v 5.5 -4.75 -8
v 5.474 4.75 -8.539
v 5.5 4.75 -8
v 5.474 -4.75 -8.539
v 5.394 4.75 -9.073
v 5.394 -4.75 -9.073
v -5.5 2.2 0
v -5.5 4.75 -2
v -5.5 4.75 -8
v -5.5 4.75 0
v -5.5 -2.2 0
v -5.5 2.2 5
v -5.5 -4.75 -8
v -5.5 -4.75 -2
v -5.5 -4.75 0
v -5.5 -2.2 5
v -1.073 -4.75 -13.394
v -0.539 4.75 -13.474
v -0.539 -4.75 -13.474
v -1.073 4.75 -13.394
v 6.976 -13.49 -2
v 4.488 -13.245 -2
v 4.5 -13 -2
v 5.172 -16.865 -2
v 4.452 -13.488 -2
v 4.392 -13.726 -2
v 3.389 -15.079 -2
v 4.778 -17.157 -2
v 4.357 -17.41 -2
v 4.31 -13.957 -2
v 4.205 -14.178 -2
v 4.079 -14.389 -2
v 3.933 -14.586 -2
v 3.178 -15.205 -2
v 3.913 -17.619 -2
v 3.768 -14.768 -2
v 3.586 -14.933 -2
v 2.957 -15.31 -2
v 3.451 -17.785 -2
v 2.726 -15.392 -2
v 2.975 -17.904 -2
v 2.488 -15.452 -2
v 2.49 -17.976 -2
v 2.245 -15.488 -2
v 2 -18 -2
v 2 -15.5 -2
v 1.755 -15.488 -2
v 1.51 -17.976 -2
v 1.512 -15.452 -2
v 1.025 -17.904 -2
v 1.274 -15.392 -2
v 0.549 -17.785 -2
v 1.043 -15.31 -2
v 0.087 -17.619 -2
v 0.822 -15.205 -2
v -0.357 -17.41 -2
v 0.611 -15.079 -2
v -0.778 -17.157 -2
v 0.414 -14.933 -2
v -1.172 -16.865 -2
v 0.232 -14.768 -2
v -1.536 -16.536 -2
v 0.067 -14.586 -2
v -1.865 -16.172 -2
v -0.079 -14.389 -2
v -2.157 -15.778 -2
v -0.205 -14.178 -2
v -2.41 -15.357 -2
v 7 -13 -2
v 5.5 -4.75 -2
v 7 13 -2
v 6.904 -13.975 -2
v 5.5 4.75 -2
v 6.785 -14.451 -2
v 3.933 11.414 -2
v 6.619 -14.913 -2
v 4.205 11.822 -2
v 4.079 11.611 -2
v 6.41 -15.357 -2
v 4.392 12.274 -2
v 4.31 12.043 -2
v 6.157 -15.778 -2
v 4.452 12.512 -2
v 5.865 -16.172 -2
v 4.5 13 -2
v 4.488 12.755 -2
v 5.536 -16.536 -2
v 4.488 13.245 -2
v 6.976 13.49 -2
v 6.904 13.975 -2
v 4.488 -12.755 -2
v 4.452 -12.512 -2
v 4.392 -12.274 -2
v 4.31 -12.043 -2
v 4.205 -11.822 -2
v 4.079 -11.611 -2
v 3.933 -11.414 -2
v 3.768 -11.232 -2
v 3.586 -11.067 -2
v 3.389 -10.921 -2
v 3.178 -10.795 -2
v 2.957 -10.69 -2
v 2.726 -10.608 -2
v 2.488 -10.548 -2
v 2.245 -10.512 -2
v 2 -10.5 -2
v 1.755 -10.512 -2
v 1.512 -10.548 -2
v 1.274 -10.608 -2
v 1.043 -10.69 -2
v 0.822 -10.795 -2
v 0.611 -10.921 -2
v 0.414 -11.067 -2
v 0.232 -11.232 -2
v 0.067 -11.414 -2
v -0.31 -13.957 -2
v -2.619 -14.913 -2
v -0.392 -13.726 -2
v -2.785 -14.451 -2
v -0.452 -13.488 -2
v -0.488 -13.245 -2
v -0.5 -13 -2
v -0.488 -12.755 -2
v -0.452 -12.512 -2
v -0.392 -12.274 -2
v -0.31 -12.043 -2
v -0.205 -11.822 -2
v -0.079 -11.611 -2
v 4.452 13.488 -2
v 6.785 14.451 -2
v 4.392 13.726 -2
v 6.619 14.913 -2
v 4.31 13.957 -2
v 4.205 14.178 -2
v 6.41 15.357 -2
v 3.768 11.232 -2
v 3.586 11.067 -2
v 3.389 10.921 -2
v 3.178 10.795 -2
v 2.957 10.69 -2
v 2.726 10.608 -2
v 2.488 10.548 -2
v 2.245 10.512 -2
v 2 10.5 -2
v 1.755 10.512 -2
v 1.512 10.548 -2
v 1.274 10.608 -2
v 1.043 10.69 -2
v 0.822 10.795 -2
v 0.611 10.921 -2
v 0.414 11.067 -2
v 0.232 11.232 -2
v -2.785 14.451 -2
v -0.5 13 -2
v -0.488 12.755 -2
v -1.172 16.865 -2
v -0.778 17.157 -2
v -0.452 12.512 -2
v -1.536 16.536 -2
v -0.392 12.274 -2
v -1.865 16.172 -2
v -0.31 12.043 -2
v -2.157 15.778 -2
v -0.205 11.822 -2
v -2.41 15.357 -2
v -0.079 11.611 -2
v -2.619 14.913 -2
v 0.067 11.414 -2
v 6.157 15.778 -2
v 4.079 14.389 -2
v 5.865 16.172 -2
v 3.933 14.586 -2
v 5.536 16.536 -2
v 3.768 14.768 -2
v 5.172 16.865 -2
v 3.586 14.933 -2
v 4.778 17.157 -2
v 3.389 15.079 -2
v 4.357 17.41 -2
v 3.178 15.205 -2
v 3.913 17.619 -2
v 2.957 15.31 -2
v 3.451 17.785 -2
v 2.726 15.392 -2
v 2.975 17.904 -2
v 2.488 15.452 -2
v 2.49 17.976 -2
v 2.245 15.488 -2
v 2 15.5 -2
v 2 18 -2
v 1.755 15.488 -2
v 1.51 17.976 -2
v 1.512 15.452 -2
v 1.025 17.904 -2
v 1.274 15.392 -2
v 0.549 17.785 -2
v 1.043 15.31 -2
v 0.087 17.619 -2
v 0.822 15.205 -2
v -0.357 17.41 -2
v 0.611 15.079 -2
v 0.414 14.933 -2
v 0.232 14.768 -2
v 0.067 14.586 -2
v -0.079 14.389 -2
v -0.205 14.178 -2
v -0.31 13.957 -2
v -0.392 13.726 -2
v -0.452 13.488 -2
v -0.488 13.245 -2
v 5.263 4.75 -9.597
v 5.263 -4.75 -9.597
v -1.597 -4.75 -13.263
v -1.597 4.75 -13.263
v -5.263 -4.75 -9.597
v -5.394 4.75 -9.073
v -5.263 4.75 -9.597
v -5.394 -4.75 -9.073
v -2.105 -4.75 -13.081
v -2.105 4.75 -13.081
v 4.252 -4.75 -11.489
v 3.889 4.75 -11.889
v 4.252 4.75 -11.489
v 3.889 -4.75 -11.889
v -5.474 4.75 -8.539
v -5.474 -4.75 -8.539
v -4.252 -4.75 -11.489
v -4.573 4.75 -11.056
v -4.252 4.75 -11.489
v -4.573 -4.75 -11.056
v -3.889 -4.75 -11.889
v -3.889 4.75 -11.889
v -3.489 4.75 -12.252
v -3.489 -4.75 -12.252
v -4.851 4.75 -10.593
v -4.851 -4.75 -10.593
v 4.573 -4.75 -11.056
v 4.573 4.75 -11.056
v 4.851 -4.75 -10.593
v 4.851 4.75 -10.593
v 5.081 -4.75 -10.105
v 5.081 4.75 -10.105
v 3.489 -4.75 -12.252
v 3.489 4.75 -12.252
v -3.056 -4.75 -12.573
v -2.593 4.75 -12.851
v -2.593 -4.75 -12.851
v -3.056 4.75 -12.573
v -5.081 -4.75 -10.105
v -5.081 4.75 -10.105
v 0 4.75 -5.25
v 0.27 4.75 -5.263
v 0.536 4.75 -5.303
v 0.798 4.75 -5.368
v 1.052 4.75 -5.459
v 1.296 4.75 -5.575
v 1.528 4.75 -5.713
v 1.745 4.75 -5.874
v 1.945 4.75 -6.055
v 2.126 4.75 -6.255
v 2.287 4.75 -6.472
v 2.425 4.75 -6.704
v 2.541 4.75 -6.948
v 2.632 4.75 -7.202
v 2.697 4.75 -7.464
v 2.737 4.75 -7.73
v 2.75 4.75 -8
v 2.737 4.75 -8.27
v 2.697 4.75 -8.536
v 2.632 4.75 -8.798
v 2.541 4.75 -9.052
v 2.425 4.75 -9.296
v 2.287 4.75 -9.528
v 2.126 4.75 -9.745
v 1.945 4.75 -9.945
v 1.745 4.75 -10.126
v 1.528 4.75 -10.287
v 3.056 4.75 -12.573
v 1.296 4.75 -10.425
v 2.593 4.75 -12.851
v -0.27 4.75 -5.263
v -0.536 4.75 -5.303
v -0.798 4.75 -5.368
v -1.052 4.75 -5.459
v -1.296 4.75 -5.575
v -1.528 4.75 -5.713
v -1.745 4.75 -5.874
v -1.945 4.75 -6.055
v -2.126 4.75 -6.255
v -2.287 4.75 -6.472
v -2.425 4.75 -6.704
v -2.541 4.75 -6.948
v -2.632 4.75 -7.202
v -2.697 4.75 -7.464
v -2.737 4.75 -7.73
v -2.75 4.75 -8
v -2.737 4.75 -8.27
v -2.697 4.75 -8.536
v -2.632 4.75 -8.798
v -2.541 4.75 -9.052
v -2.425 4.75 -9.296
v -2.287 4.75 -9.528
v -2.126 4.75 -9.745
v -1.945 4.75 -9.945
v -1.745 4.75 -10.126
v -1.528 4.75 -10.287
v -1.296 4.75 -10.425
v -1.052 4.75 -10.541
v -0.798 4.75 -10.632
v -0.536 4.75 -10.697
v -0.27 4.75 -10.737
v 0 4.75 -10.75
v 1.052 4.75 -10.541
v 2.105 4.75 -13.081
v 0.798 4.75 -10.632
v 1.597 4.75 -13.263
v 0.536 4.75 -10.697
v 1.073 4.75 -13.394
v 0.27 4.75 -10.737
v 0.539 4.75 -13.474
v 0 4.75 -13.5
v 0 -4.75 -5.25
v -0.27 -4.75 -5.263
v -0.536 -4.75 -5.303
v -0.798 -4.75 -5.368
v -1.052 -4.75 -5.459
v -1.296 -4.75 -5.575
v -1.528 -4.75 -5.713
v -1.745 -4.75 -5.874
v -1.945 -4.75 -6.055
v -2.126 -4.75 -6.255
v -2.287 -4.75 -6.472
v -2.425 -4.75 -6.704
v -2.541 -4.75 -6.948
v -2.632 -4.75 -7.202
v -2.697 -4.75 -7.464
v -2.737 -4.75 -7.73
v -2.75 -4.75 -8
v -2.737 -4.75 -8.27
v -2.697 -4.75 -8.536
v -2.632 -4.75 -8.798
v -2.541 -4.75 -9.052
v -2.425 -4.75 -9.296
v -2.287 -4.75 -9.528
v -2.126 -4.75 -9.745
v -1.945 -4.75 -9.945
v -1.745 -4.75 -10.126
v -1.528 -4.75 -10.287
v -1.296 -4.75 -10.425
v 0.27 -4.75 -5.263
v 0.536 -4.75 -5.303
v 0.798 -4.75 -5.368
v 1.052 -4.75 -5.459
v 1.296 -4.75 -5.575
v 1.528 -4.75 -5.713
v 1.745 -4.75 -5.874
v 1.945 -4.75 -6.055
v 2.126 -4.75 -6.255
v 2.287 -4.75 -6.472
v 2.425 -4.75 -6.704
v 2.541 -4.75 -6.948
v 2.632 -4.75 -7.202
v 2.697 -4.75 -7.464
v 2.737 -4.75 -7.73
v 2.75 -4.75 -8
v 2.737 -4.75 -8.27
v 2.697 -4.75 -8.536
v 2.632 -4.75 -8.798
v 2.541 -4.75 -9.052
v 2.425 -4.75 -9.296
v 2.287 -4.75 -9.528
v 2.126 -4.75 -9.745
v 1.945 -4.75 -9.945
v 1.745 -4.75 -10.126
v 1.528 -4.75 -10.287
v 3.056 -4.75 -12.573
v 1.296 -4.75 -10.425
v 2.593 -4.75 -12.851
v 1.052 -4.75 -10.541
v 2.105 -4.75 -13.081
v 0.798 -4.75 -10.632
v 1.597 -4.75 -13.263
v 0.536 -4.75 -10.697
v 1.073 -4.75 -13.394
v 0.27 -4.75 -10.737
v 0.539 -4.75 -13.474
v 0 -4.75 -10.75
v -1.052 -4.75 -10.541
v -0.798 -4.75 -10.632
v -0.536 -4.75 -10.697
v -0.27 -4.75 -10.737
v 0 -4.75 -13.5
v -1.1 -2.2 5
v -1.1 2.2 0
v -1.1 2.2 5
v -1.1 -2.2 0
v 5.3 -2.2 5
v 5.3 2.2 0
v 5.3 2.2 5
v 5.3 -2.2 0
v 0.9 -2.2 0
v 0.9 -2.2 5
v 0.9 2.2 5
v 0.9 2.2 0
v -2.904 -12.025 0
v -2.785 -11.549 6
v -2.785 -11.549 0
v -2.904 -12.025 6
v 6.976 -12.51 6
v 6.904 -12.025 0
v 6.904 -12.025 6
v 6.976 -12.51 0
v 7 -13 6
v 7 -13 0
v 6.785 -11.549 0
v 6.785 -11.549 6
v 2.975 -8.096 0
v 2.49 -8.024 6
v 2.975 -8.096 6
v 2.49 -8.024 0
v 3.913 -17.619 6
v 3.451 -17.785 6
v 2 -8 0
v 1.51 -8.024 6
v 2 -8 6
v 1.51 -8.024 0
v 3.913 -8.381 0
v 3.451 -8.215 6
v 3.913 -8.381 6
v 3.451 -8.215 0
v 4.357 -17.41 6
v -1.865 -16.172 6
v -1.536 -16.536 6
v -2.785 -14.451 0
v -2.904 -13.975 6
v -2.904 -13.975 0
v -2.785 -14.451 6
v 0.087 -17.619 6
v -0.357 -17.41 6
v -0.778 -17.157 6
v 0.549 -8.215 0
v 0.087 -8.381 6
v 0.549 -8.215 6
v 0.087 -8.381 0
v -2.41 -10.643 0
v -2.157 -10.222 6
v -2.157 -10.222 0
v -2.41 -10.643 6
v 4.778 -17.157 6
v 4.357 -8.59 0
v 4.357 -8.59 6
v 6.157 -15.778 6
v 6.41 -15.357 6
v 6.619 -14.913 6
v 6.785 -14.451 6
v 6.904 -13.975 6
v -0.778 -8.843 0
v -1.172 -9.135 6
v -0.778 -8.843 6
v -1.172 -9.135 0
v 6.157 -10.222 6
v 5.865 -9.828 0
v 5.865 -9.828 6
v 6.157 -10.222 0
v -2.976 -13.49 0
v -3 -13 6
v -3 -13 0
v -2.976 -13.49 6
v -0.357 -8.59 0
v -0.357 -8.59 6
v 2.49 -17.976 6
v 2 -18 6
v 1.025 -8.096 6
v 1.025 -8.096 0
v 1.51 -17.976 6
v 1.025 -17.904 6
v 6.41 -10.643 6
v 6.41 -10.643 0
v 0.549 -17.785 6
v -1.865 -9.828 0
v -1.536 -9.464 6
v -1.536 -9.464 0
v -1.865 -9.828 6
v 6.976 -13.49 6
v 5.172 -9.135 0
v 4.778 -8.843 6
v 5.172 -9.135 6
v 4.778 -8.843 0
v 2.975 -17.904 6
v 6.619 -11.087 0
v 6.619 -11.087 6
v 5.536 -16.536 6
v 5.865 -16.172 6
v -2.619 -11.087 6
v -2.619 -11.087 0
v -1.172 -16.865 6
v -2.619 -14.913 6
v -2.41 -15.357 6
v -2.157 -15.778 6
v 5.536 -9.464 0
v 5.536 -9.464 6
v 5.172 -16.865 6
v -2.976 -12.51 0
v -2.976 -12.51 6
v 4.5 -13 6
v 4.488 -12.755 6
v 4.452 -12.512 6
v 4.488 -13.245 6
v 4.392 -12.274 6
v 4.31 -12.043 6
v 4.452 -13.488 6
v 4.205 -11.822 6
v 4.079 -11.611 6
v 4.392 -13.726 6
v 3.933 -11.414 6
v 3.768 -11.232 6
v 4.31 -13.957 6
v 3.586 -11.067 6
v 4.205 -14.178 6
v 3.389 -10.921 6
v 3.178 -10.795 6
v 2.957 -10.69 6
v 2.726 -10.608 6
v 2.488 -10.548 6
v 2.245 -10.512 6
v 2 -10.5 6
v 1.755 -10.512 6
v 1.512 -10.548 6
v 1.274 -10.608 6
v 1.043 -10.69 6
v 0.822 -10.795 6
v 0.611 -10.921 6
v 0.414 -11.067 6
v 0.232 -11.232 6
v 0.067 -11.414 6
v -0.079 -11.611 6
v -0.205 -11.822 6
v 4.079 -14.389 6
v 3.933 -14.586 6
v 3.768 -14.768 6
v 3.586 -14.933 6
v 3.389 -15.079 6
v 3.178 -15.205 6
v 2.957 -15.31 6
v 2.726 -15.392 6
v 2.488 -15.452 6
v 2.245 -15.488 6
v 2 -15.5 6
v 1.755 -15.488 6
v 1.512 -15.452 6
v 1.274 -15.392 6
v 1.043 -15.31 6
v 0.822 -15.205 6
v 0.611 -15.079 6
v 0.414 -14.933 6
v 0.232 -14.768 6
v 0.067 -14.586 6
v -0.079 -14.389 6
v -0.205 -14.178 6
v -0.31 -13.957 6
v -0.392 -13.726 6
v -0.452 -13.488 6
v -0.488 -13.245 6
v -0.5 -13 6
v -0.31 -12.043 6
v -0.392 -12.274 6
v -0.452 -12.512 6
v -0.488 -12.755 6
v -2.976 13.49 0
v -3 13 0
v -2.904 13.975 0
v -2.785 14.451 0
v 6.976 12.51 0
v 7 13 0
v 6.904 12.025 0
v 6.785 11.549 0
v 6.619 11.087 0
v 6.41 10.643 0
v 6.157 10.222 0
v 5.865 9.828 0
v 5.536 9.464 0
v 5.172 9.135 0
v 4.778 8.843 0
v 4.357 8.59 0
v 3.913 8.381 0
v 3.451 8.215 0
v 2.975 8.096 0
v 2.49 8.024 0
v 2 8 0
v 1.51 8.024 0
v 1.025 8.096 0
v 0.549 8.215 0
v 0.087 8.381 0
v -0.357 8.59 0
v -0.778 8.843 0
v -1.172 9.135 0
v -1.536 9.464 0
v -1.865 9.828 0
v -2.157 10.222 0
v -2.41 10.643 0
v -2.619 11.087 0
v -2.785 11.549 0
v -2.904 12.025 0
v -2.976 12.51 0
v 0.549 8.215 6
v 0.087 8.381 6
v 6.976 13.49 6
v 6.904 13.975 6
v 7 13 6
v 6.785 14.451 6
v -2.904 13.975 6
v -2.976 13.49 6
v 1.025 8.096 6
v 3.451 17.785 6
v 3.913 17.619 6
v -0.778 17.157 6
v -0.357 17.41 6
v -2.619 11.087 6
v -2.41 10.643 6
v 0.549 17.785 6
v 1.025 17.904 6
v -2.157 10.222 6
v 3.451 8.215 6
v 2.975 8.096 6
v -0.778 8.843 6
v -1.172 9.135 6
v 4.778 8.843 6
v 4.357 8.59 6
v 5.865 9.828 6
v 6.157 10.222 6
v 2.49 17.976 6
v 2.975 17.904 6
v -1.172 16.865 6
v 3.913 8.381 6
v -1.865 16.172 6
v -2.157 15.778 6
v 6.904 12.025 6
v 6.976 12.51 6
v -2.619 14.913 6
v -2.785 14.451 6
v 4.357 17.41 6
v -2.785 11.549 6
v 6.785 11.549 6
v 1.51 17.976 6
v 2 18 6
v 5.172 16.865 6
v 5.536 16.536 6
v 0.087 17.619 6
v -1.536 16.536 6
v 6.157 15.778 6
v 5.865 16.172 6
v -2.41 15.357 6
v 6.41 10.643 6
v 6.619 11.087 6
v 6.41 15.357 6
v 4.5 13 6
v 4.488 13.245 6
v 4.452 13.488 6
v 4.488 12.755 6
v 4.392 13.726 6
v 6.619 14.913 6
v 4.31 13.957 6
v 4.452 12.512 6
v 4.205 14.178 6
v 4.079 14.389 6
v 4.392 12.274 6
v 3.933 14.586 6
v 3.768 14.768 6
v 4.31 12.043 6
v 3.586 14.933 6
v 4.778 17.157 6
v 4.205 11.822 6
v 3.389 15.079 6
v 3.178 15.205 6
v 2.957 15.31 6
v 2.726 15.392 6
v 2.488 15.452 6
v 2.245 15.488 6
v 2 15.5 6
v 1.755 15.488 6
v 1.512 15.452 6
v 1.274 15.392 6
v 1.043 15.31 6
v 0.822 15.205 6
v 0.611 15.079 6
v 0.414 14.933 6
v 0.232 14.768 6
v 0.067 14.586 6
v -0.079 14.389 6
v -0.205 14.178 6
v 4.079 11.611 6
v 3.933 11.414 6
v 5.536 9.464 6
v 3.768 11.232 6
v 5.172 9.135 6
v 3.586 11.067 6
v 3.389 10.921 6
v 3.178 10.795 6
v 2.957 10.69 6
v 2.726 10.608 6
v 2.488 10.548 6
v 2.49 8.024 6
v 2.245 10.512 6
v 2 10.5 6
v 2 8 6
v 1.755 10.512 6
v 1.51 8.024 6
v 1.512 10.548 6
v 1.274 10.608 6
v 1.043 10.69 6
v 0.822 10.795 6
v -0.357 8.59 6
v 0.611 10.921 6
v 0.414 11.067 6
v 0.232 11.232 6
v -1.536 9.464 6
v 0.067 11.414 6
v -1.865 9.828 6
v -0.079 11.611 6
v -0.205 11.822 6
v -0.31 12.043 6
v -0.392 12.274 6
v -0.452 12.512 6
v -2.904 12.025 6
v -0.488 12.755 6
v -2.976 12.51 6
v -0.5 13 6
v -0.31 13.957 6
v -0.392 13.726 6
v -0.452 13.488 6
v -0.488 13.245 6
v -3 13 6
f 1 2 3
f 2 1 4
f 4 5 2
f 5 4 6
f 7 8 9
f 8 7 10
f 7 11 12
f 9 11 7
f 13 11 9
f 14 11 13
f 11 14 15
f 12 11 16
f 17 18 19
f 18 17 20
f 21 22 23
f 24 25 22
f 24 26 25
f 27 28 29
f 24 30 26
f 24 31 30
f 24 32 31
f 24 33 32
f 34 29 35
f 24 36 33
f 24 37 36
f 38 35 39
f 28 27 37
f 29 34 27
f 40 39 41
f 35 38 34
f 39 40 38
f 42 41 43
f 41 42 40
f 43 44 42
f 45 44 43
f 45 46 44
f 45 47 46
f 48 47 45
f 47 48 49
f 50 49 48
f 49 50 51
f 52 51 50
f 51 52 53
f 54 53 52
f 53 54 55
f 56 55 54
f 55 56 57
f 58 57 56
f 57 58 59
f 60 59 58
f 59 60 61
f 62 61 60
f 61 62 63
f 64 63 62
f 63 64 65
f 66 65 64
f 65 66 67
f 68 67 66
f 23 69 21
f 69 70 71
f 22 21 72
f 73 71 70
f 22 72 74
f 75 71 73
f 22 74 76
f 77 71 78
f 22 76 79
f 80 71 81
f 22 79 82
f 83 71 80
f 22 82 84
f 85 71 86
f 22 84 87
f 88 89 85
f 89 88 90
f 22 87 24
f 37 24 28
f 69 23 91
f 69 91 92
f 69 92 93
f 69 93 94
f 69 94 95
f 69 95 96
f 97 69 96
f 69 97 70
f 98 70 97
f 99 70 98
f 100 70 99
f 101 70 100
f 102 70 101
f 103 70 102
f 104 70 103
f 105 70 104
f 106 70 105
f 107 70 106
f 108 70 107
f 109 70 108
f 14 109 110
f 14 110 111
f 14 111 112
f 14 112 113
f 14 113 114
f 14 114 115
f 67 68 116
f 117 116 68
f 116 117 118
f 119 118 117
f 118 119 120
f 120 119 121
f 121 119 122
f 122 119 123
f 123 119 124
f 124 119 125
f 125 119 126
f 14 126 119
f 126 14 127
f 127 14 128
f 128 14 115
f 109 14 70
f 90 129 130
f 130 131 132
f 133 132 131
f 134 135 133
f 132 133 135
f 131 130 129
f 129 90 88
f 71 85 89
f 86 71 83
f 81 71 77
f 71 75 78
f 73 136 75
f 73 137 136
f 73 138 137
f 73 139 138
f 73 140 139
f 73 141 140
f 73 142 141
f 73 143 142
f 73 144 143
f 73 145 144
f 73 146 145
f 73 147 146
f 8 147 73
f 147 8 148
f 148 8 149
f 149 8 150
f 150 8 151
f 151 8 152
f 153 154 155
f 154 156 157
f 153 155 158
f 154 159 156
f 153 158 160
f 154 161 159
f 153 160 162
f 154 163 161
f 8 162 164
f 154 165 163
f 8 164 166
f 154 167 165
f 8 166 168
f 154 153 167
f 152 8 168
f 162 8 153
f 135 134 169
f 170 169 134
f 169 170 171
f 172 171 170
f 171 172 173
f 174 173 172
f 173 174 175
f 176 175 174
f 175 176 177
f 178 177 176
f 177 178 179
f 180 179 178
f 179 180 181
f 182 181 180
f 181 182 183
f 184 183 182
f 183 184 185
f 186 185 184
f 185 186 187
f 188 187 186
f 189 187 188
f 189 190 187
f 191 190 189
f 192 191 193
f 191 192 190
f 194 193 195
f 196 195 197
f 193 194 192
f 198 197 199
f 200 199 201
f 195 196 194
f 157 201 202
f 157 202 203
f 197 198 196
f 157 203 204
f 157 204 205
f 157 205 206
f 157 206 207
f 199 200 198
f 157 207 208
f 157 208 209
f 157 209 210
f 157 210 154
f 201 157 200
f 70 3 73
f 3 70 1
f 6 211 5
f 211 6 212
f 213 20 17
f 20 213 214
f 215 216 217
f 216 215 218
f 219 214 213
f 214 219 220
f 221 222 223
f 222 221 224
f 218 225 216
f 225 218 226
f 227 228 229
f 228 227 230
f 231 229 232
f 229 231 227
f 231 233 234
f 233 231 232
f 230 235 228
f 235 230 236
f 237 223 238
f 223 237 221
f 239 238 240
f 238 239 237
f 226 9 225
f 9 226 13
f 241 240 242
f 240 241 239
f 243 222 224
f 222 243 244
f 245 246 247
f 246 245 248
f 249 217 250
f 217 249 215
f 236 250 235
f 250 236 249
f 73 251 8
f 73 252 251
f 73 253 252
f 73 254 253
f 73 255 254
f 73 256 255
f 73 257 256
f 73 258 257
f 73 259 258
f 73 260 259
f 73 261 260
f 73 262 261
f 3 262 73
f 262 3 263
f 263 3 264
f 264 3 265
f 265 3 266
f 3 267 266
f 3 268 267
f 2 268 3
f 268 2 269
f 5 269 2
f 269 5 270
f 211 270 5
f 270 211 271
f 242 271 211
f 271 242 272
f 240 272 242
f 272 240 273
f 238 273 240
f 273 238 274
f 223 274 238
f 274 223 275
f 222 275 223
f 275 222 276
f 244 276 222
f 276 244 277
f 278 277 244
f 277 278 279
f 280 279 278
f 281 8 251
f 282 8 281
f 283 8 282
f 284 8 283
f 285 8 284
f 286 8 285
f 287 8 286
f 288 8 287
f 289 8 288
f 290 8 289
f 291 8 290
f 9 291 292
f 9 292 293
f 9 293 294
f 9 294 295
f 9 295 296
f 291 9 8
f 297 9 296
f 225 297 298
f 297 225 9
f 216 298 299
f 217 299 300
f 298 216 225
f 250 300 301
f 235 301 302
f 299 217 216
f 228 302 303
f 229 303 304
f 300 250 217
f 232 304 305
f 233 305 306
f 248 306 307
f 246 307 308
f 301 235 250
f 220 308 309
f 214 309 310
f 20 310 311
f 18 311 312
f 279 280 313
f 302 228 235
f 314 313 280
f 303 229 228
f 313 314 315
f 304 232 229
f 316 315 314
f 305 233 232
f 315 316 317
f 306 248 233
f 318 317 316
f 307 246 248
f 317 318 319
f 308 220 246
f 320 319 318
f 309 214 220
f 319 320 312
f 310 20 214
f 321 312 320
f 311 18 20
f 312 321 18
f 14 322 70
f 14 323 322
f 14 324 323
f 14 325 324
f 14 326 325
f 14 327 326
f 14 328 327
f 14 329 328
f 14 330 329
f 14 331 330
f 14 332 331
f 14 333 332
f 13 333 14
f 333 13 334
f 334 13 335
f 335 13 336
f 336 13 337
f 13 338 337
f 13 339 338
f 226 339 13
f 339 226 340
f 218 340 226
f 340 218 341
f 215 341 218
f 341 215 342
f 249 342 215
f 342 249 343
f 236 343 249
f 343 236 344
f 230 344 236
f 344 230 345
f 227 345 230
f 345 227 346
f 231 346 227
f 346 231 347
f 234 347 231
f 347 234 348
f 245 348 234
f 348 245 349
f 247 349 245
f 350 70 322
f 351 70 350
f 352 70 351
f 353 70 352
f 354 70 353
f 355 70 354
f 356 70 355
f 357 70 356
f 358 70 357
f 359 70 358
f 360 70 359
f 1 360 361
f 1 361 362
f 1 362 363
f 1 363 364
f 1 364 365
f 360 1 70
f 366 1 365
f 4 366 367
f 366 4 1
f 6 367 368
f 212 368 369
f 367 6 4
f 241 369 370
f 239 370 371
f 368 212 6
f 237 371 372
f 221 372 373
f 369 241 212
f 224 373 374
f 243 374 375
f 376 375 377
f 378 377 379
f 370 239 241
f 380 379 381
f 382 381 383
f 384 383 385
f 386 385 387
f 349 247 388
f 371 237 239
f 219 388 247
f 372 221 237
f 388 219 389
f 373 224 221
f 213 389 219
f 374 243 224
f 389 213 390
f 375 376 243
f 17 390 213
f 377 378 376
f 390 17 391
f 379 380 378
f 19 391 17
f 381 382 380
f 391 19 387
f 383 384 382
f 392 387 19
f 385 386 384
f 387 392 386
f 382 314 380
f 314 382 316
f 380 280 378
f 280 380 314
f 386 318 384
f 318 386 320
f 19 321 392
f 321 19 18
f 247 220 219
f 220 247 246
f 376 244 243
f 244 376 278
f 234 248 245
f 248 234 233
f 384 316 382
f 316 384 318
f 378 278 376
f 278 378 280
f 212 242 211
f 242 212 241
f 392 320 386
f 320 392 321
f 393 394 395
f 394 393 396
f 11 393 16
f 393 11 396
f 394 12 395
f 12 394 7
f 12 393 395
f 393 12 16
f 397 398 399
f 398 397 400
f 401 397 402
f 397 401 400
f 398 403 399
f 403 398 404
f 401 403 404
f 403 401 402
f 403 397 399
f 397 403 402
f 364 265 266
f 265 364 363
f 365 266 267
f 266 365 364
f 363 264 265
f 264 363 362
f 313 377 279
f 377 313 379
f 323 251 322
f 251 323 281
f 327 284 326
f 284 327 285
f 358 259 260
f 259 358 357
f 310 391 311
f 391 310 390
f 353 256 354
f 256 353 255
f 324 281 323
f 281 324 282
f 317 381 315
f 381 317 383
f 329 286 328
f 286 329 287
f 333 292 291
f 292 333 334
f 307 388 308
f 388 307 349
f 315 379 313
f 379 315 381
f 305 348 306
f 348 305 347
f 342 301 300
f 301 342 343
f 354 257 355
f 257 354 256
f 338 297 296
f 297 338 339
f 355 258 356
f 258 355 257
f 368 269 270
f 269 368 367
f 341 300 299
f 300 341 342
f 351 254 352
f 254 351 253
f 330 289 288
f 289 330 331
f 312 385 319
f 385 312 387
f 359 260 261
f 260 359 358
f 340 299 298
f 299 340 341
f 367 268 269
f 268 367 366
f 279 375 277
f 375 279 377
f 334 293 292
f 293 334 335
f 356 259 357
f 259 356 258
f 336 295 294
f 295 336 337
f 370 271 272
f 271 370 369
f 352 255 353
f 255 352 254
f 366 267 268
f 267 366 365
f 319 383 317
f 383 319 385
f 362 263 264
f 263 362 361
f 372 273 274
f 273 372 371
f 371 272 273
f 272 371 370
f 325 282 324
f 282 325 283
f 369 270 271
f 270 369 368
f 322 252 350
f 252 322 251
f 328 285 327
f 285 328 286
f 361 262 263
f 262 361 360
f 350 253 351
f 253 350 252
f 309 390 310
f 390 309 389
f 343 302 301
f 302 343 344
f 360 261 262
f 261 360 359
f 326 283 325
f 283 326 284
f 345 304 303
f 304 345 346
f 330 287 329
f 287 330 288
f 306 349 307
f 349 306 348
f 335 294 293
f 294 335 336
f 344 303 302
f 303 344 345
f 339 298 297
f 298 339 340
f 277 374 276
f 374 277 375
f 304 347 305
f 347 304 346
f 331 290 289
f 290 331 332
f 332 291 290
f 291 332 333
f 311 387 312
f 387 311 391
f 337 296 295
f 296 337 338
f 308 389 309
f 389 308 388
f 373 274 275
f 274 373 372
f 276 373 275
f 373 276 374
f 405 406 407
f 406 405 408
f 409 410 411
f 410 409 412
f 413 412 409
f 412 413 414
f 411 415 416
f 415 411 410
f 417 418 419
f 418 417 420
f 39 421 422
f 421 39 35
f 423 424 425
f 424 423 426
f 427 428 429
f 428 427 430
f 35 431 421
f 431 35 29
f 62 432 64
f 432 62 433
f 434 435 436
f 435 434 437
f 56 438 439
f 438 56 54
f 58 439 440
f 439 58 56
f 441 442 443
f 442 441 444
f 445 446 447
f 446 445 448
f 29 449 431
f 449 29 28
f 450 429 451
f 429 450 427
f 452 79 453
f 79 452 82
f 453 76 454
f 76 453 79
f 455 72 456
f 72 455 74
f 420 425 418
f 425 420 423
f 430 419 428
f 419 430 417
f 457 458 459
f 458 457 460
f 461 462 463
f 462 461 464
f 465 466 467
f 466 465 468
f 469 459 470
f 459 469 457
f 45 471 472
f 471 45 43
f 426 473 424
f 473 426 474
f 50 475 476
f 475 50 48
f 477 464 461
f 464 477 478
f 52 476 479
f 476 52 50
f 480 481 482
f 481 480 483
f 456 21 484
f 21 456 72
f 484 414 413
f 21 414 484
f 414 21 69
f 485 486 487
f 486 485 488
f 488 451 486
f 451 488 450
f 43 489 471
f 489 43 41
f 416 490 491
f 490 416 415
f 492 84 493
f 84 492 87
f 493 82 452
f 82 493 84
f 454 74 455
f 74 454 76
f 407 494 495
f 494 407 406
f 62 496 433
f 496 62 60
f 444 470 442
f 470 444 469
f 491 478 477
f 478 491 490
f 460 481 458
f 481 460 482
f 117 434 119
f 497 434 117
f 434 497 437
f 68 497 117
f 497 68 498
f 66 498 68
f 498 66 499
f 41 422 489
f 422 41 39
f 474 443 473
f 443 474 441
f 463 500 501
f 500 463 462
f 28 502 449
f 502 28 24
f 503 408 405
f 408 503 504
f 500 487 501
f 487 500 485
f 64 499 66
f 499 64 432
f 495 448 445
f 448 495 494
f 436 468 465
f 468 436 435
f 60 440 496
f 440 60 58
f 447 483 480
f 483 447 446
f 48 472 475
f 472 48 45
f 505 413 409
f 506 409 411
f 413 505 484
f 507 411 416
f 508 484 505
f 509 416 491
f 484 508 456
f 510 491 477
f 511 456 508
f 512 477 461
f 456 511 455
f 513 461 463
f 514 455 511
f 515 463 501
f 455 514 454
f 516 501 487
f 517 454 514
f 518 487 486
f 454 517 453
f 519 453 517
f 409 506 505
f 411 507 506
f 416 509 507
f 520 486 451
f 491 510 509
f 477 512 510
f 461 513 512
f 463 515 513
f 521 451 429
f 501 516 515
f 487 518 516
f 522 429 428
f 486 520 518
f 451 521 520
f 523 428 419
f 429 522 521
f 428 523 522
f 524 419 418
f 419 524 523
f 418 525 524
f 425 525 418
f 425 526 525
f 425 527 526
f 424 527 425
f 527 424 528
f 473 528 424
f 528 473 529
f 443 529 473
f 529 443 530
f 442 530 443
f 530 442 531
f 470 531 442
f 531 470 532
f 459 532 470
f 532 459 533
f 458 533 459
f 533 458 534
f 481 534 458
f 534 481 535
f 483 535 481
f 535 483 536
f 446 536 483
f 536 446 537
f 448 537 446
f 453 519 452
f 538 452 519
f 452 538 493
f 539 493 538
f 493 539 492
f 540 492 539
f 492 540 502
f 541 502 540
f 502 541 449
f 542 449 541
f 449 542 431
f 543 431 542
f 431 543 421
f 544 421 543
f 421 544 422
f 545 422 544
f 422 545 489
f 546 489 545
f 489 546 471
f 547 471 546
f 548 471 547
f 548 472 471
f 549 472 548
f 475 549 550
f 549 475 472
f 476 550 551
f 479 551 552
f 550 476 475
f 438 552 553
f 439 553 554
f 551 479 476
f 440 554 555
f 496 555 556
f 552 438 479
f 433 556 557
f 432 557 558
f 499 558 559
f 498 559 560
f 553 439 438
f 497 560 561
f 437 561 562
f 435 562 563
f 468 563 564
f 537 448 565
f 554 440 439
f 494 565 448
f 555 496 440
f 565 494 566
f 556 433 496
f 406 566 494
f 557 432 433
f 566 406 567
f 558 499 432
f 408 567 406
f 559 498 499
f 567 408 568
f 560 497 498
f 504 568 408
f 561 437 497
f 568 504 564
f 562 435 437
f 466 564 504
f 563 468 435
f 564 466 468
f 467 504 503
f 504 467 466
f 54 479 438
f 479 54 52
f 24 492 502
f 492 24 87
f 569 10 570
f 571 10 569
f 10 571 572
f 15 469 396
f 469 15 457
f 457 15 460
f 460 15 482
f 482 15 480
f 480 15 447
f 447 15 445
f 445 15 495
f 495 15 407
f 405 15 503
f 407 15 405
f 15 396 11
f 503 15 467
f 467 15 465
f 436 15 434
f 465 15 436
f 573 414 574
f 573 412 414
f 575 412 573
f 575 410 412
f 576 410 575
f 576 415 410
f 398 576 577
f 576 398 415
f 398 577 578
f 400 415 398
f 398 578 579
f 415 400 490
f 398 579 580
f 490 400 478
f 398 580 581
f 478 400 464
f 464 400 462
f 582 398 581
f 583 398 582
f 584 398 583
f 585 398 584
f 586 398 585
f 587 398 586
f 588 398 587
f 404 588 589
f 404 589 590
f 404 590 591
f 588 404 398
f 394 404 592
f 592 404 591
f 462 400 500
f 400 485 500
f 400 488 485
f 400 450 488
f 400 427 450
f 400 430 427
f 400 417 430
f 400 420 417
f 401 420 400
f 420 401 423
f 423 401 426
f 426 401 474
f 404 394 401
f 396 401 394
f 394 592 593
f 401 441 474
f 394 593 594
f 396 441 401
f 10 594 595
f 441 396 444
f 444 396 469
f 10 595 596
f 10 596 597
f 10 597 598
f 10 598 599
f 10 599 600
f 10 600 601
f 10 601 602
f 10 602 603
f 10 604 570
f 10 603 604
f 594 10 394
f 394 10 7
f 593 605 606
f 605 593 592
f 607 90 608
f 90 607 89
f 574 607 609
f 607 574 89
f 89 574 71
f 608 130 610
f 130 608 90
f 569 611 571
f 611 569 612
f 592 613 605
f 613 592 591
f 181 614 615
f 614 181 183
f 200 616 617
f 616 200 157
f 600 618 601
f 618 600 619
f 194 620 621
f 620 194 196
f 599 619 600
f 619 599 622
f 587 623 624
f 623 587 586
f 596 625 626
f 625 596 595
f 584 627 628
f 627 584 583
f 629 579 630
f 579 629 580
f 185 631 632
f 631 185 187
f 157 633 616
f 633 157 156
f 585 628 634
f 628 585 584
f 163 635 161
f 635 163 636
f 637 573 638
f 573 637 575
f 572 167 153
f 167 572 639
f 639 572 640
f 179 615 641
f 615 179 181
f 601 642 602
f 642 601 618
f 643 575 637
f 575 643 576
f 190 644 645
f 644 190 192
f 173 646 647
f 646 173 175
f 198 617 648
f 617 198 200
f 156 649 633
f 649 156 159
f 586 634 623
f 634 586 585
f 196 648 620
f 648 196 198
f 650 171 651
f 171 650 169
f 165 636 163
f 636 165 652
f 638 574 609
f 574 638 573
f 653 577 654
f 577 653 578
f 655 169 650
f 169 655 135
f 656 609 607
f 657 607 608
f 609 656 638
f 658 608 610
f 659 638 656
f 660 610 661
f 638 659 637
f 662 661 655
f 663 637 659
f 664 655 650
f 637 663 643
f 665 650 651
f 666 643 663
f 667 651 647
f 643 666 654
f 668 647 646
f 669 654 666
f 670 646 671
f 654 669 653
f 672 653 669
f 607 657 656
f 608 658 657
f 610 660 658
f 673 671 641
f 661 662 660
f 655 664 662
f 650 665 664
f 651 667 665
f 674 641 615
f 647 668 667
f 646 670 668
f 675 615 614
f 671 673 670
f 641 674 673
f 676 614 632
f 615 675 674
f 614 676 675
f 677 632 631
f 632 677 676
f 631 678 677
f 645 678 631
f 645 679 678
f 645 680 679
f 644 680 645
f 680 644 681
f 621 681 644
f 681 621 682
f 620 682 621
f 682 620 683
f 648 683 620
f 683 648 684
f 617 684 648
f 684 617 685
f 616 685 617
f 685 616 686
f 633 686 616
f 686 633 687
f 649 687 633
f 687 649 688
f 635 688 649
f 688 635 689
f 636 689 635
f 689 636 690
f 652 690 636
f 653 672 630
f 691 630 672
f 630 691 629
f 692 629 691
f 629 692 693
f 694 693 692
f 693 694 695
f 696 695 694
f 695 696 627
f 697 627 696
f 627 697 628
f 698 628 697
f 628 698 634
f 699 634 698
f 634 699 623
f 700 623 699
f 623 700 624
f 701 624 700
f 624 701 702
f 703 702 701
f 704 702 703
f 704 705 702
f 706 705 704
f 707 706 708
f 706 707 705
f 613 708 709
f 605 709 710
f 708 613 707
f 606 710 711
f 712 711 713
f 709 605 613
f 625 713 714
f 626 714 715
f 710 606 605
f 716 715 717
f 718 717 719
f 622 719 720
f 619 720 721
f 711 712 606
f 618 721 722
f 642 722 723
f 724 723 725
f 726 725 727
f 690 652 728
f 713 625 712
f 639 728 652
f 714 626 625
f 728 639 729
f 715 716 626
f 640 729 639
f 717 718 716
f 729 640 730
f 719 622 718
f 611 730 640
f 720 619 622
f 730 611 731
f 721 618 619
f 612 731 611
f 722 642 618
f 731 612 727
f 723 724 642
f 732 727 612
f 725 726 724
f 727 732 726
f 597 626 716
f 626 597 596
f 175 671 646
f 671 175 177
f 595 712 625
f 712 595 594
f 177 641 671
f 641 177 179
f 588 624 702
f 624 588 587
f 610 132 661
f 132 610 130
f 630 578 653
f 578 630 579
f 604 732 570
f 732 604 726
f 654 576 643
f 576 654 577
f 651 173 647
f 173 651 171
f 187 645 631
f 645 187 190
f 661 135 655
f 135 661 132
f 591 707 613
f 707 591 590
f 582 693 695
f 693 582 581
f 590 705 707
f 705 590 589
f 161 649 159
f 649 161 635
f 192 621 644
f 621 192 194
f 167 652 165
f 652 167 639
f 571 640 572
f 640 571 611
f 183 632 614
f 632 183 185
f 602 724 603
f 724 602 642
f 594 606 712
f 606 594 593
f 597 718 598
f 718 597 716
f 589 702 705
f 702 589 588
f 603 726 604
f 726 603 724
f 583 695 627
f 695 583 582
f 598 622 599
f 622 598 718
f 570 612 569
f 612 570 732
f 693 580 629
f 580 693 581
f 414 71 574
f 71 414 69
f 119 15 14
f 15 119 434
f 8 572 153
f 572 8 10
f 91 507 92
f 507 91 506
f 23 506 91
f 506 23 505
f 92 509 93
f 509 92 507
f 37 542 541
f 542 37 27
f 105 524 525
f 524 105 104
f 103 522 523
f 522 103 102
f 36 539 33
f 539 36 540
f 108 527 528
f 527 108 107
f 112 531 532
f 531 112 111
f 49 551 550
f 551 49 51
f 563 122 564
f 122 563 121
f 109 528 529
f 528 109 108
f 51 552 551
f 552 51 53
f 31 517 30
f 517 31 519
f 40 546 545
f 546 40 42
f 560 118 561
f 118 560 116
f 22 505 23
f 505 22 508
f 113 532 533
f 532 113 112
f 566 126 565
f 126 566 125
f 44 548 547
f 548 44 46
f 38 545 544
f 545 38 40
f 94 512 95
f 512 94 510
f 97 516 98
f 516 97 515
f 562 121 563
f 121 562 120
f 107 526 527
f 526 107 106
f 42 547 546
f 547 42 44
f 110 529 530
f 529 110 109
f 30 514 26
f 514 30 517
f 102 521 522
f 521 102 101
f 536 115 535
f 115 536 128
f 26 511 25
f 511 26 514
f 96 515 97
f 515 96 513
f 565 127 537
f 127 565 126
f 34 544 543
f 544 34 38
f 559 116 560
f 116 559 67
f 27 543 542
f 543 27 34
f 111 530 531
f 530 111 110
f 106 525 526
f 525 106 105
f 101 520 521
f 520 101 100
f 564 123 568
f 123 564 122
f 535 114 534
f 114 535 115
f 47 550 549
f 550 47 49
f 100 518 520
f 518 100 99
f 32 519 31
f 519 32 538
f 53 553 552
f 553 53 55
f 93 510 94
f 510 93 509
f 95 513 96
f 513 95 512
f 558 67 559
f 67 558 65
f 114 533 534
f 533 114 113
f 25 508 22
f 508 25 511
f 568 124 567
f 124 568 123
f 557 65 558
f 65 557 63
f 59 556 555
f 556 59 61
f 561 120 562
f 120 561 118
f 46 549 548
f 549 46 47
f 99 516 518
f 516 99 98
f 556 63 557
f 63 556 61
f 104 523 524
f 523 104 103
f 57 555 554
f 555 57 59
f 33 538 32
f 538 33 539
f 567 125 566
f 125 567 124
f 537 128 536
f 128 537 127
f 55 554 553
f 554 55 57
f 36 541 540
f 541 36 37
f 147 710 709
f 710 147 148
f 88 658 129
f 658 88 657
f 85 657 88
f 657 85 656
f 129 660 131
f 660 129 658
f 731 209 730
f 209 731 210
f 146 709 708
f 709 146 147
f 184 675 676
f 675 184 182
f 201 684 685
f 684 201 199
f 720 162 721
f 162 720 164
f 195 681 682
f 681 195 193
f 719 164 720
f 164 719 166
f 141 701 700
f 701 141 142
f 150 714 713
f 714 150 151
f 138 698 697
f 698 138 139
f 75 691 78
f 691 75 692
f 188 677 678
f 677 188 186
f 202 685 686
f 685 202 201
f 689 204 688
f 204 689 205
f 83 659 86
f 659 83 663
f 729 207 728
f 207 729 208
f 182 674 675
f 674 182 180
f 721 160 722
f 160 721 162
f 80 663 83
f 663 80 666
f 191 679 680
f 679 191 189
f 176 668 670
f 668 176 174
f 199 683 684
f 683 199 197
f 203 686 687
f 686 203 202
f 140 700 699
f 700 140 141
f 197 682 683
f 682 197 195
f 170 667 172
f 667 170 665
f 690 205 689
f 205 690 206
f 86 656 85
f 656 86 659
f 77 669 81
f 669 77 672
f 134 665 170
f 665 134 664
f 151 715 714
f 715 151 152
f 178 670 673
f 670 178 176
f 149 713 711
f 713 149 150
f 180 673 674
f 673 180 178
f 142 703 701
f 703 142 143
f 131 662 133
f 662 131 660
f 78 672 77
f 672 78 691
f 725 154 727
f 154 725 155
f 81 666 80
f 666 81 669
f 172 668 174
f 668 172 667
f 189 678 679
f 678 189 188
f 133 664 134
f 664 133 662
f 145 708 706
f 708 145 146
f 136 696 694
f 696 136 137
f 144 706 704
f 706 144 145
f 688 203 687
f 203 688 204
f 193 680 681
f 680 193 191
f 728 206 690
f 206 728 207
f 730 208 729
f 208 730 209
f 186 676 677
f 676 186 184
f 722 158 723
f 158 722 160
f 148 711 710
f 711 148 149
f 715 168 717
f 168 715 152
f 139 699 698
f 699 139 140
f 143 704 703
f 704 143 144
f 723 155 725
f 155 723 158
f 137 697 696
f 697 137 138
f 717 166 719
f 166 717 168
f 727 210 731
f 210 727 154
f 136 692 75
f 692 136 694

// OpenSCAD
$fn=64;
module mount() {
    difference() {
        union() {
            hull() {
                cylinder(d=11, h=9.5, center=true);
                translate([0,5,0])
                    cube([11,2,9.5],center=true);
            }
            translate([-11/2,5,-2.2])
                    cube([4.4,8,4.4]);
            translate([-11/2+4.4+2,5,-2.2])
                    cube([4.4,8,4.4]);
            
        }
        cylinder(d=5.5, h=100,center=true);
    }
}

module mount2(){
    dx=2;
    difference(){
        union(){
            translate([dx,-13])
                cylinder(d=10, h=6);
            translate([dx,13])
                cylinder(d=10, h=6);    
            hull() {
                translate([dx,-13,-2])
                    cylinder(d=10, h=2);
                translate([dx,13,-2])
                    cylinder(d=10, h=2); 
                
                translate([0,0,-2+1])
                    cube([11,9.5,2],center=true);
            }
        }
       translate([dx,-13])
            cylinder(d=5, h=50,center=true);
        translate([dx,13])
            cylinder(d=5, h=50,center=true);    
    }
}

translate([0,0,-8])
rotate([90,0,0])
    mount();

mount2();
